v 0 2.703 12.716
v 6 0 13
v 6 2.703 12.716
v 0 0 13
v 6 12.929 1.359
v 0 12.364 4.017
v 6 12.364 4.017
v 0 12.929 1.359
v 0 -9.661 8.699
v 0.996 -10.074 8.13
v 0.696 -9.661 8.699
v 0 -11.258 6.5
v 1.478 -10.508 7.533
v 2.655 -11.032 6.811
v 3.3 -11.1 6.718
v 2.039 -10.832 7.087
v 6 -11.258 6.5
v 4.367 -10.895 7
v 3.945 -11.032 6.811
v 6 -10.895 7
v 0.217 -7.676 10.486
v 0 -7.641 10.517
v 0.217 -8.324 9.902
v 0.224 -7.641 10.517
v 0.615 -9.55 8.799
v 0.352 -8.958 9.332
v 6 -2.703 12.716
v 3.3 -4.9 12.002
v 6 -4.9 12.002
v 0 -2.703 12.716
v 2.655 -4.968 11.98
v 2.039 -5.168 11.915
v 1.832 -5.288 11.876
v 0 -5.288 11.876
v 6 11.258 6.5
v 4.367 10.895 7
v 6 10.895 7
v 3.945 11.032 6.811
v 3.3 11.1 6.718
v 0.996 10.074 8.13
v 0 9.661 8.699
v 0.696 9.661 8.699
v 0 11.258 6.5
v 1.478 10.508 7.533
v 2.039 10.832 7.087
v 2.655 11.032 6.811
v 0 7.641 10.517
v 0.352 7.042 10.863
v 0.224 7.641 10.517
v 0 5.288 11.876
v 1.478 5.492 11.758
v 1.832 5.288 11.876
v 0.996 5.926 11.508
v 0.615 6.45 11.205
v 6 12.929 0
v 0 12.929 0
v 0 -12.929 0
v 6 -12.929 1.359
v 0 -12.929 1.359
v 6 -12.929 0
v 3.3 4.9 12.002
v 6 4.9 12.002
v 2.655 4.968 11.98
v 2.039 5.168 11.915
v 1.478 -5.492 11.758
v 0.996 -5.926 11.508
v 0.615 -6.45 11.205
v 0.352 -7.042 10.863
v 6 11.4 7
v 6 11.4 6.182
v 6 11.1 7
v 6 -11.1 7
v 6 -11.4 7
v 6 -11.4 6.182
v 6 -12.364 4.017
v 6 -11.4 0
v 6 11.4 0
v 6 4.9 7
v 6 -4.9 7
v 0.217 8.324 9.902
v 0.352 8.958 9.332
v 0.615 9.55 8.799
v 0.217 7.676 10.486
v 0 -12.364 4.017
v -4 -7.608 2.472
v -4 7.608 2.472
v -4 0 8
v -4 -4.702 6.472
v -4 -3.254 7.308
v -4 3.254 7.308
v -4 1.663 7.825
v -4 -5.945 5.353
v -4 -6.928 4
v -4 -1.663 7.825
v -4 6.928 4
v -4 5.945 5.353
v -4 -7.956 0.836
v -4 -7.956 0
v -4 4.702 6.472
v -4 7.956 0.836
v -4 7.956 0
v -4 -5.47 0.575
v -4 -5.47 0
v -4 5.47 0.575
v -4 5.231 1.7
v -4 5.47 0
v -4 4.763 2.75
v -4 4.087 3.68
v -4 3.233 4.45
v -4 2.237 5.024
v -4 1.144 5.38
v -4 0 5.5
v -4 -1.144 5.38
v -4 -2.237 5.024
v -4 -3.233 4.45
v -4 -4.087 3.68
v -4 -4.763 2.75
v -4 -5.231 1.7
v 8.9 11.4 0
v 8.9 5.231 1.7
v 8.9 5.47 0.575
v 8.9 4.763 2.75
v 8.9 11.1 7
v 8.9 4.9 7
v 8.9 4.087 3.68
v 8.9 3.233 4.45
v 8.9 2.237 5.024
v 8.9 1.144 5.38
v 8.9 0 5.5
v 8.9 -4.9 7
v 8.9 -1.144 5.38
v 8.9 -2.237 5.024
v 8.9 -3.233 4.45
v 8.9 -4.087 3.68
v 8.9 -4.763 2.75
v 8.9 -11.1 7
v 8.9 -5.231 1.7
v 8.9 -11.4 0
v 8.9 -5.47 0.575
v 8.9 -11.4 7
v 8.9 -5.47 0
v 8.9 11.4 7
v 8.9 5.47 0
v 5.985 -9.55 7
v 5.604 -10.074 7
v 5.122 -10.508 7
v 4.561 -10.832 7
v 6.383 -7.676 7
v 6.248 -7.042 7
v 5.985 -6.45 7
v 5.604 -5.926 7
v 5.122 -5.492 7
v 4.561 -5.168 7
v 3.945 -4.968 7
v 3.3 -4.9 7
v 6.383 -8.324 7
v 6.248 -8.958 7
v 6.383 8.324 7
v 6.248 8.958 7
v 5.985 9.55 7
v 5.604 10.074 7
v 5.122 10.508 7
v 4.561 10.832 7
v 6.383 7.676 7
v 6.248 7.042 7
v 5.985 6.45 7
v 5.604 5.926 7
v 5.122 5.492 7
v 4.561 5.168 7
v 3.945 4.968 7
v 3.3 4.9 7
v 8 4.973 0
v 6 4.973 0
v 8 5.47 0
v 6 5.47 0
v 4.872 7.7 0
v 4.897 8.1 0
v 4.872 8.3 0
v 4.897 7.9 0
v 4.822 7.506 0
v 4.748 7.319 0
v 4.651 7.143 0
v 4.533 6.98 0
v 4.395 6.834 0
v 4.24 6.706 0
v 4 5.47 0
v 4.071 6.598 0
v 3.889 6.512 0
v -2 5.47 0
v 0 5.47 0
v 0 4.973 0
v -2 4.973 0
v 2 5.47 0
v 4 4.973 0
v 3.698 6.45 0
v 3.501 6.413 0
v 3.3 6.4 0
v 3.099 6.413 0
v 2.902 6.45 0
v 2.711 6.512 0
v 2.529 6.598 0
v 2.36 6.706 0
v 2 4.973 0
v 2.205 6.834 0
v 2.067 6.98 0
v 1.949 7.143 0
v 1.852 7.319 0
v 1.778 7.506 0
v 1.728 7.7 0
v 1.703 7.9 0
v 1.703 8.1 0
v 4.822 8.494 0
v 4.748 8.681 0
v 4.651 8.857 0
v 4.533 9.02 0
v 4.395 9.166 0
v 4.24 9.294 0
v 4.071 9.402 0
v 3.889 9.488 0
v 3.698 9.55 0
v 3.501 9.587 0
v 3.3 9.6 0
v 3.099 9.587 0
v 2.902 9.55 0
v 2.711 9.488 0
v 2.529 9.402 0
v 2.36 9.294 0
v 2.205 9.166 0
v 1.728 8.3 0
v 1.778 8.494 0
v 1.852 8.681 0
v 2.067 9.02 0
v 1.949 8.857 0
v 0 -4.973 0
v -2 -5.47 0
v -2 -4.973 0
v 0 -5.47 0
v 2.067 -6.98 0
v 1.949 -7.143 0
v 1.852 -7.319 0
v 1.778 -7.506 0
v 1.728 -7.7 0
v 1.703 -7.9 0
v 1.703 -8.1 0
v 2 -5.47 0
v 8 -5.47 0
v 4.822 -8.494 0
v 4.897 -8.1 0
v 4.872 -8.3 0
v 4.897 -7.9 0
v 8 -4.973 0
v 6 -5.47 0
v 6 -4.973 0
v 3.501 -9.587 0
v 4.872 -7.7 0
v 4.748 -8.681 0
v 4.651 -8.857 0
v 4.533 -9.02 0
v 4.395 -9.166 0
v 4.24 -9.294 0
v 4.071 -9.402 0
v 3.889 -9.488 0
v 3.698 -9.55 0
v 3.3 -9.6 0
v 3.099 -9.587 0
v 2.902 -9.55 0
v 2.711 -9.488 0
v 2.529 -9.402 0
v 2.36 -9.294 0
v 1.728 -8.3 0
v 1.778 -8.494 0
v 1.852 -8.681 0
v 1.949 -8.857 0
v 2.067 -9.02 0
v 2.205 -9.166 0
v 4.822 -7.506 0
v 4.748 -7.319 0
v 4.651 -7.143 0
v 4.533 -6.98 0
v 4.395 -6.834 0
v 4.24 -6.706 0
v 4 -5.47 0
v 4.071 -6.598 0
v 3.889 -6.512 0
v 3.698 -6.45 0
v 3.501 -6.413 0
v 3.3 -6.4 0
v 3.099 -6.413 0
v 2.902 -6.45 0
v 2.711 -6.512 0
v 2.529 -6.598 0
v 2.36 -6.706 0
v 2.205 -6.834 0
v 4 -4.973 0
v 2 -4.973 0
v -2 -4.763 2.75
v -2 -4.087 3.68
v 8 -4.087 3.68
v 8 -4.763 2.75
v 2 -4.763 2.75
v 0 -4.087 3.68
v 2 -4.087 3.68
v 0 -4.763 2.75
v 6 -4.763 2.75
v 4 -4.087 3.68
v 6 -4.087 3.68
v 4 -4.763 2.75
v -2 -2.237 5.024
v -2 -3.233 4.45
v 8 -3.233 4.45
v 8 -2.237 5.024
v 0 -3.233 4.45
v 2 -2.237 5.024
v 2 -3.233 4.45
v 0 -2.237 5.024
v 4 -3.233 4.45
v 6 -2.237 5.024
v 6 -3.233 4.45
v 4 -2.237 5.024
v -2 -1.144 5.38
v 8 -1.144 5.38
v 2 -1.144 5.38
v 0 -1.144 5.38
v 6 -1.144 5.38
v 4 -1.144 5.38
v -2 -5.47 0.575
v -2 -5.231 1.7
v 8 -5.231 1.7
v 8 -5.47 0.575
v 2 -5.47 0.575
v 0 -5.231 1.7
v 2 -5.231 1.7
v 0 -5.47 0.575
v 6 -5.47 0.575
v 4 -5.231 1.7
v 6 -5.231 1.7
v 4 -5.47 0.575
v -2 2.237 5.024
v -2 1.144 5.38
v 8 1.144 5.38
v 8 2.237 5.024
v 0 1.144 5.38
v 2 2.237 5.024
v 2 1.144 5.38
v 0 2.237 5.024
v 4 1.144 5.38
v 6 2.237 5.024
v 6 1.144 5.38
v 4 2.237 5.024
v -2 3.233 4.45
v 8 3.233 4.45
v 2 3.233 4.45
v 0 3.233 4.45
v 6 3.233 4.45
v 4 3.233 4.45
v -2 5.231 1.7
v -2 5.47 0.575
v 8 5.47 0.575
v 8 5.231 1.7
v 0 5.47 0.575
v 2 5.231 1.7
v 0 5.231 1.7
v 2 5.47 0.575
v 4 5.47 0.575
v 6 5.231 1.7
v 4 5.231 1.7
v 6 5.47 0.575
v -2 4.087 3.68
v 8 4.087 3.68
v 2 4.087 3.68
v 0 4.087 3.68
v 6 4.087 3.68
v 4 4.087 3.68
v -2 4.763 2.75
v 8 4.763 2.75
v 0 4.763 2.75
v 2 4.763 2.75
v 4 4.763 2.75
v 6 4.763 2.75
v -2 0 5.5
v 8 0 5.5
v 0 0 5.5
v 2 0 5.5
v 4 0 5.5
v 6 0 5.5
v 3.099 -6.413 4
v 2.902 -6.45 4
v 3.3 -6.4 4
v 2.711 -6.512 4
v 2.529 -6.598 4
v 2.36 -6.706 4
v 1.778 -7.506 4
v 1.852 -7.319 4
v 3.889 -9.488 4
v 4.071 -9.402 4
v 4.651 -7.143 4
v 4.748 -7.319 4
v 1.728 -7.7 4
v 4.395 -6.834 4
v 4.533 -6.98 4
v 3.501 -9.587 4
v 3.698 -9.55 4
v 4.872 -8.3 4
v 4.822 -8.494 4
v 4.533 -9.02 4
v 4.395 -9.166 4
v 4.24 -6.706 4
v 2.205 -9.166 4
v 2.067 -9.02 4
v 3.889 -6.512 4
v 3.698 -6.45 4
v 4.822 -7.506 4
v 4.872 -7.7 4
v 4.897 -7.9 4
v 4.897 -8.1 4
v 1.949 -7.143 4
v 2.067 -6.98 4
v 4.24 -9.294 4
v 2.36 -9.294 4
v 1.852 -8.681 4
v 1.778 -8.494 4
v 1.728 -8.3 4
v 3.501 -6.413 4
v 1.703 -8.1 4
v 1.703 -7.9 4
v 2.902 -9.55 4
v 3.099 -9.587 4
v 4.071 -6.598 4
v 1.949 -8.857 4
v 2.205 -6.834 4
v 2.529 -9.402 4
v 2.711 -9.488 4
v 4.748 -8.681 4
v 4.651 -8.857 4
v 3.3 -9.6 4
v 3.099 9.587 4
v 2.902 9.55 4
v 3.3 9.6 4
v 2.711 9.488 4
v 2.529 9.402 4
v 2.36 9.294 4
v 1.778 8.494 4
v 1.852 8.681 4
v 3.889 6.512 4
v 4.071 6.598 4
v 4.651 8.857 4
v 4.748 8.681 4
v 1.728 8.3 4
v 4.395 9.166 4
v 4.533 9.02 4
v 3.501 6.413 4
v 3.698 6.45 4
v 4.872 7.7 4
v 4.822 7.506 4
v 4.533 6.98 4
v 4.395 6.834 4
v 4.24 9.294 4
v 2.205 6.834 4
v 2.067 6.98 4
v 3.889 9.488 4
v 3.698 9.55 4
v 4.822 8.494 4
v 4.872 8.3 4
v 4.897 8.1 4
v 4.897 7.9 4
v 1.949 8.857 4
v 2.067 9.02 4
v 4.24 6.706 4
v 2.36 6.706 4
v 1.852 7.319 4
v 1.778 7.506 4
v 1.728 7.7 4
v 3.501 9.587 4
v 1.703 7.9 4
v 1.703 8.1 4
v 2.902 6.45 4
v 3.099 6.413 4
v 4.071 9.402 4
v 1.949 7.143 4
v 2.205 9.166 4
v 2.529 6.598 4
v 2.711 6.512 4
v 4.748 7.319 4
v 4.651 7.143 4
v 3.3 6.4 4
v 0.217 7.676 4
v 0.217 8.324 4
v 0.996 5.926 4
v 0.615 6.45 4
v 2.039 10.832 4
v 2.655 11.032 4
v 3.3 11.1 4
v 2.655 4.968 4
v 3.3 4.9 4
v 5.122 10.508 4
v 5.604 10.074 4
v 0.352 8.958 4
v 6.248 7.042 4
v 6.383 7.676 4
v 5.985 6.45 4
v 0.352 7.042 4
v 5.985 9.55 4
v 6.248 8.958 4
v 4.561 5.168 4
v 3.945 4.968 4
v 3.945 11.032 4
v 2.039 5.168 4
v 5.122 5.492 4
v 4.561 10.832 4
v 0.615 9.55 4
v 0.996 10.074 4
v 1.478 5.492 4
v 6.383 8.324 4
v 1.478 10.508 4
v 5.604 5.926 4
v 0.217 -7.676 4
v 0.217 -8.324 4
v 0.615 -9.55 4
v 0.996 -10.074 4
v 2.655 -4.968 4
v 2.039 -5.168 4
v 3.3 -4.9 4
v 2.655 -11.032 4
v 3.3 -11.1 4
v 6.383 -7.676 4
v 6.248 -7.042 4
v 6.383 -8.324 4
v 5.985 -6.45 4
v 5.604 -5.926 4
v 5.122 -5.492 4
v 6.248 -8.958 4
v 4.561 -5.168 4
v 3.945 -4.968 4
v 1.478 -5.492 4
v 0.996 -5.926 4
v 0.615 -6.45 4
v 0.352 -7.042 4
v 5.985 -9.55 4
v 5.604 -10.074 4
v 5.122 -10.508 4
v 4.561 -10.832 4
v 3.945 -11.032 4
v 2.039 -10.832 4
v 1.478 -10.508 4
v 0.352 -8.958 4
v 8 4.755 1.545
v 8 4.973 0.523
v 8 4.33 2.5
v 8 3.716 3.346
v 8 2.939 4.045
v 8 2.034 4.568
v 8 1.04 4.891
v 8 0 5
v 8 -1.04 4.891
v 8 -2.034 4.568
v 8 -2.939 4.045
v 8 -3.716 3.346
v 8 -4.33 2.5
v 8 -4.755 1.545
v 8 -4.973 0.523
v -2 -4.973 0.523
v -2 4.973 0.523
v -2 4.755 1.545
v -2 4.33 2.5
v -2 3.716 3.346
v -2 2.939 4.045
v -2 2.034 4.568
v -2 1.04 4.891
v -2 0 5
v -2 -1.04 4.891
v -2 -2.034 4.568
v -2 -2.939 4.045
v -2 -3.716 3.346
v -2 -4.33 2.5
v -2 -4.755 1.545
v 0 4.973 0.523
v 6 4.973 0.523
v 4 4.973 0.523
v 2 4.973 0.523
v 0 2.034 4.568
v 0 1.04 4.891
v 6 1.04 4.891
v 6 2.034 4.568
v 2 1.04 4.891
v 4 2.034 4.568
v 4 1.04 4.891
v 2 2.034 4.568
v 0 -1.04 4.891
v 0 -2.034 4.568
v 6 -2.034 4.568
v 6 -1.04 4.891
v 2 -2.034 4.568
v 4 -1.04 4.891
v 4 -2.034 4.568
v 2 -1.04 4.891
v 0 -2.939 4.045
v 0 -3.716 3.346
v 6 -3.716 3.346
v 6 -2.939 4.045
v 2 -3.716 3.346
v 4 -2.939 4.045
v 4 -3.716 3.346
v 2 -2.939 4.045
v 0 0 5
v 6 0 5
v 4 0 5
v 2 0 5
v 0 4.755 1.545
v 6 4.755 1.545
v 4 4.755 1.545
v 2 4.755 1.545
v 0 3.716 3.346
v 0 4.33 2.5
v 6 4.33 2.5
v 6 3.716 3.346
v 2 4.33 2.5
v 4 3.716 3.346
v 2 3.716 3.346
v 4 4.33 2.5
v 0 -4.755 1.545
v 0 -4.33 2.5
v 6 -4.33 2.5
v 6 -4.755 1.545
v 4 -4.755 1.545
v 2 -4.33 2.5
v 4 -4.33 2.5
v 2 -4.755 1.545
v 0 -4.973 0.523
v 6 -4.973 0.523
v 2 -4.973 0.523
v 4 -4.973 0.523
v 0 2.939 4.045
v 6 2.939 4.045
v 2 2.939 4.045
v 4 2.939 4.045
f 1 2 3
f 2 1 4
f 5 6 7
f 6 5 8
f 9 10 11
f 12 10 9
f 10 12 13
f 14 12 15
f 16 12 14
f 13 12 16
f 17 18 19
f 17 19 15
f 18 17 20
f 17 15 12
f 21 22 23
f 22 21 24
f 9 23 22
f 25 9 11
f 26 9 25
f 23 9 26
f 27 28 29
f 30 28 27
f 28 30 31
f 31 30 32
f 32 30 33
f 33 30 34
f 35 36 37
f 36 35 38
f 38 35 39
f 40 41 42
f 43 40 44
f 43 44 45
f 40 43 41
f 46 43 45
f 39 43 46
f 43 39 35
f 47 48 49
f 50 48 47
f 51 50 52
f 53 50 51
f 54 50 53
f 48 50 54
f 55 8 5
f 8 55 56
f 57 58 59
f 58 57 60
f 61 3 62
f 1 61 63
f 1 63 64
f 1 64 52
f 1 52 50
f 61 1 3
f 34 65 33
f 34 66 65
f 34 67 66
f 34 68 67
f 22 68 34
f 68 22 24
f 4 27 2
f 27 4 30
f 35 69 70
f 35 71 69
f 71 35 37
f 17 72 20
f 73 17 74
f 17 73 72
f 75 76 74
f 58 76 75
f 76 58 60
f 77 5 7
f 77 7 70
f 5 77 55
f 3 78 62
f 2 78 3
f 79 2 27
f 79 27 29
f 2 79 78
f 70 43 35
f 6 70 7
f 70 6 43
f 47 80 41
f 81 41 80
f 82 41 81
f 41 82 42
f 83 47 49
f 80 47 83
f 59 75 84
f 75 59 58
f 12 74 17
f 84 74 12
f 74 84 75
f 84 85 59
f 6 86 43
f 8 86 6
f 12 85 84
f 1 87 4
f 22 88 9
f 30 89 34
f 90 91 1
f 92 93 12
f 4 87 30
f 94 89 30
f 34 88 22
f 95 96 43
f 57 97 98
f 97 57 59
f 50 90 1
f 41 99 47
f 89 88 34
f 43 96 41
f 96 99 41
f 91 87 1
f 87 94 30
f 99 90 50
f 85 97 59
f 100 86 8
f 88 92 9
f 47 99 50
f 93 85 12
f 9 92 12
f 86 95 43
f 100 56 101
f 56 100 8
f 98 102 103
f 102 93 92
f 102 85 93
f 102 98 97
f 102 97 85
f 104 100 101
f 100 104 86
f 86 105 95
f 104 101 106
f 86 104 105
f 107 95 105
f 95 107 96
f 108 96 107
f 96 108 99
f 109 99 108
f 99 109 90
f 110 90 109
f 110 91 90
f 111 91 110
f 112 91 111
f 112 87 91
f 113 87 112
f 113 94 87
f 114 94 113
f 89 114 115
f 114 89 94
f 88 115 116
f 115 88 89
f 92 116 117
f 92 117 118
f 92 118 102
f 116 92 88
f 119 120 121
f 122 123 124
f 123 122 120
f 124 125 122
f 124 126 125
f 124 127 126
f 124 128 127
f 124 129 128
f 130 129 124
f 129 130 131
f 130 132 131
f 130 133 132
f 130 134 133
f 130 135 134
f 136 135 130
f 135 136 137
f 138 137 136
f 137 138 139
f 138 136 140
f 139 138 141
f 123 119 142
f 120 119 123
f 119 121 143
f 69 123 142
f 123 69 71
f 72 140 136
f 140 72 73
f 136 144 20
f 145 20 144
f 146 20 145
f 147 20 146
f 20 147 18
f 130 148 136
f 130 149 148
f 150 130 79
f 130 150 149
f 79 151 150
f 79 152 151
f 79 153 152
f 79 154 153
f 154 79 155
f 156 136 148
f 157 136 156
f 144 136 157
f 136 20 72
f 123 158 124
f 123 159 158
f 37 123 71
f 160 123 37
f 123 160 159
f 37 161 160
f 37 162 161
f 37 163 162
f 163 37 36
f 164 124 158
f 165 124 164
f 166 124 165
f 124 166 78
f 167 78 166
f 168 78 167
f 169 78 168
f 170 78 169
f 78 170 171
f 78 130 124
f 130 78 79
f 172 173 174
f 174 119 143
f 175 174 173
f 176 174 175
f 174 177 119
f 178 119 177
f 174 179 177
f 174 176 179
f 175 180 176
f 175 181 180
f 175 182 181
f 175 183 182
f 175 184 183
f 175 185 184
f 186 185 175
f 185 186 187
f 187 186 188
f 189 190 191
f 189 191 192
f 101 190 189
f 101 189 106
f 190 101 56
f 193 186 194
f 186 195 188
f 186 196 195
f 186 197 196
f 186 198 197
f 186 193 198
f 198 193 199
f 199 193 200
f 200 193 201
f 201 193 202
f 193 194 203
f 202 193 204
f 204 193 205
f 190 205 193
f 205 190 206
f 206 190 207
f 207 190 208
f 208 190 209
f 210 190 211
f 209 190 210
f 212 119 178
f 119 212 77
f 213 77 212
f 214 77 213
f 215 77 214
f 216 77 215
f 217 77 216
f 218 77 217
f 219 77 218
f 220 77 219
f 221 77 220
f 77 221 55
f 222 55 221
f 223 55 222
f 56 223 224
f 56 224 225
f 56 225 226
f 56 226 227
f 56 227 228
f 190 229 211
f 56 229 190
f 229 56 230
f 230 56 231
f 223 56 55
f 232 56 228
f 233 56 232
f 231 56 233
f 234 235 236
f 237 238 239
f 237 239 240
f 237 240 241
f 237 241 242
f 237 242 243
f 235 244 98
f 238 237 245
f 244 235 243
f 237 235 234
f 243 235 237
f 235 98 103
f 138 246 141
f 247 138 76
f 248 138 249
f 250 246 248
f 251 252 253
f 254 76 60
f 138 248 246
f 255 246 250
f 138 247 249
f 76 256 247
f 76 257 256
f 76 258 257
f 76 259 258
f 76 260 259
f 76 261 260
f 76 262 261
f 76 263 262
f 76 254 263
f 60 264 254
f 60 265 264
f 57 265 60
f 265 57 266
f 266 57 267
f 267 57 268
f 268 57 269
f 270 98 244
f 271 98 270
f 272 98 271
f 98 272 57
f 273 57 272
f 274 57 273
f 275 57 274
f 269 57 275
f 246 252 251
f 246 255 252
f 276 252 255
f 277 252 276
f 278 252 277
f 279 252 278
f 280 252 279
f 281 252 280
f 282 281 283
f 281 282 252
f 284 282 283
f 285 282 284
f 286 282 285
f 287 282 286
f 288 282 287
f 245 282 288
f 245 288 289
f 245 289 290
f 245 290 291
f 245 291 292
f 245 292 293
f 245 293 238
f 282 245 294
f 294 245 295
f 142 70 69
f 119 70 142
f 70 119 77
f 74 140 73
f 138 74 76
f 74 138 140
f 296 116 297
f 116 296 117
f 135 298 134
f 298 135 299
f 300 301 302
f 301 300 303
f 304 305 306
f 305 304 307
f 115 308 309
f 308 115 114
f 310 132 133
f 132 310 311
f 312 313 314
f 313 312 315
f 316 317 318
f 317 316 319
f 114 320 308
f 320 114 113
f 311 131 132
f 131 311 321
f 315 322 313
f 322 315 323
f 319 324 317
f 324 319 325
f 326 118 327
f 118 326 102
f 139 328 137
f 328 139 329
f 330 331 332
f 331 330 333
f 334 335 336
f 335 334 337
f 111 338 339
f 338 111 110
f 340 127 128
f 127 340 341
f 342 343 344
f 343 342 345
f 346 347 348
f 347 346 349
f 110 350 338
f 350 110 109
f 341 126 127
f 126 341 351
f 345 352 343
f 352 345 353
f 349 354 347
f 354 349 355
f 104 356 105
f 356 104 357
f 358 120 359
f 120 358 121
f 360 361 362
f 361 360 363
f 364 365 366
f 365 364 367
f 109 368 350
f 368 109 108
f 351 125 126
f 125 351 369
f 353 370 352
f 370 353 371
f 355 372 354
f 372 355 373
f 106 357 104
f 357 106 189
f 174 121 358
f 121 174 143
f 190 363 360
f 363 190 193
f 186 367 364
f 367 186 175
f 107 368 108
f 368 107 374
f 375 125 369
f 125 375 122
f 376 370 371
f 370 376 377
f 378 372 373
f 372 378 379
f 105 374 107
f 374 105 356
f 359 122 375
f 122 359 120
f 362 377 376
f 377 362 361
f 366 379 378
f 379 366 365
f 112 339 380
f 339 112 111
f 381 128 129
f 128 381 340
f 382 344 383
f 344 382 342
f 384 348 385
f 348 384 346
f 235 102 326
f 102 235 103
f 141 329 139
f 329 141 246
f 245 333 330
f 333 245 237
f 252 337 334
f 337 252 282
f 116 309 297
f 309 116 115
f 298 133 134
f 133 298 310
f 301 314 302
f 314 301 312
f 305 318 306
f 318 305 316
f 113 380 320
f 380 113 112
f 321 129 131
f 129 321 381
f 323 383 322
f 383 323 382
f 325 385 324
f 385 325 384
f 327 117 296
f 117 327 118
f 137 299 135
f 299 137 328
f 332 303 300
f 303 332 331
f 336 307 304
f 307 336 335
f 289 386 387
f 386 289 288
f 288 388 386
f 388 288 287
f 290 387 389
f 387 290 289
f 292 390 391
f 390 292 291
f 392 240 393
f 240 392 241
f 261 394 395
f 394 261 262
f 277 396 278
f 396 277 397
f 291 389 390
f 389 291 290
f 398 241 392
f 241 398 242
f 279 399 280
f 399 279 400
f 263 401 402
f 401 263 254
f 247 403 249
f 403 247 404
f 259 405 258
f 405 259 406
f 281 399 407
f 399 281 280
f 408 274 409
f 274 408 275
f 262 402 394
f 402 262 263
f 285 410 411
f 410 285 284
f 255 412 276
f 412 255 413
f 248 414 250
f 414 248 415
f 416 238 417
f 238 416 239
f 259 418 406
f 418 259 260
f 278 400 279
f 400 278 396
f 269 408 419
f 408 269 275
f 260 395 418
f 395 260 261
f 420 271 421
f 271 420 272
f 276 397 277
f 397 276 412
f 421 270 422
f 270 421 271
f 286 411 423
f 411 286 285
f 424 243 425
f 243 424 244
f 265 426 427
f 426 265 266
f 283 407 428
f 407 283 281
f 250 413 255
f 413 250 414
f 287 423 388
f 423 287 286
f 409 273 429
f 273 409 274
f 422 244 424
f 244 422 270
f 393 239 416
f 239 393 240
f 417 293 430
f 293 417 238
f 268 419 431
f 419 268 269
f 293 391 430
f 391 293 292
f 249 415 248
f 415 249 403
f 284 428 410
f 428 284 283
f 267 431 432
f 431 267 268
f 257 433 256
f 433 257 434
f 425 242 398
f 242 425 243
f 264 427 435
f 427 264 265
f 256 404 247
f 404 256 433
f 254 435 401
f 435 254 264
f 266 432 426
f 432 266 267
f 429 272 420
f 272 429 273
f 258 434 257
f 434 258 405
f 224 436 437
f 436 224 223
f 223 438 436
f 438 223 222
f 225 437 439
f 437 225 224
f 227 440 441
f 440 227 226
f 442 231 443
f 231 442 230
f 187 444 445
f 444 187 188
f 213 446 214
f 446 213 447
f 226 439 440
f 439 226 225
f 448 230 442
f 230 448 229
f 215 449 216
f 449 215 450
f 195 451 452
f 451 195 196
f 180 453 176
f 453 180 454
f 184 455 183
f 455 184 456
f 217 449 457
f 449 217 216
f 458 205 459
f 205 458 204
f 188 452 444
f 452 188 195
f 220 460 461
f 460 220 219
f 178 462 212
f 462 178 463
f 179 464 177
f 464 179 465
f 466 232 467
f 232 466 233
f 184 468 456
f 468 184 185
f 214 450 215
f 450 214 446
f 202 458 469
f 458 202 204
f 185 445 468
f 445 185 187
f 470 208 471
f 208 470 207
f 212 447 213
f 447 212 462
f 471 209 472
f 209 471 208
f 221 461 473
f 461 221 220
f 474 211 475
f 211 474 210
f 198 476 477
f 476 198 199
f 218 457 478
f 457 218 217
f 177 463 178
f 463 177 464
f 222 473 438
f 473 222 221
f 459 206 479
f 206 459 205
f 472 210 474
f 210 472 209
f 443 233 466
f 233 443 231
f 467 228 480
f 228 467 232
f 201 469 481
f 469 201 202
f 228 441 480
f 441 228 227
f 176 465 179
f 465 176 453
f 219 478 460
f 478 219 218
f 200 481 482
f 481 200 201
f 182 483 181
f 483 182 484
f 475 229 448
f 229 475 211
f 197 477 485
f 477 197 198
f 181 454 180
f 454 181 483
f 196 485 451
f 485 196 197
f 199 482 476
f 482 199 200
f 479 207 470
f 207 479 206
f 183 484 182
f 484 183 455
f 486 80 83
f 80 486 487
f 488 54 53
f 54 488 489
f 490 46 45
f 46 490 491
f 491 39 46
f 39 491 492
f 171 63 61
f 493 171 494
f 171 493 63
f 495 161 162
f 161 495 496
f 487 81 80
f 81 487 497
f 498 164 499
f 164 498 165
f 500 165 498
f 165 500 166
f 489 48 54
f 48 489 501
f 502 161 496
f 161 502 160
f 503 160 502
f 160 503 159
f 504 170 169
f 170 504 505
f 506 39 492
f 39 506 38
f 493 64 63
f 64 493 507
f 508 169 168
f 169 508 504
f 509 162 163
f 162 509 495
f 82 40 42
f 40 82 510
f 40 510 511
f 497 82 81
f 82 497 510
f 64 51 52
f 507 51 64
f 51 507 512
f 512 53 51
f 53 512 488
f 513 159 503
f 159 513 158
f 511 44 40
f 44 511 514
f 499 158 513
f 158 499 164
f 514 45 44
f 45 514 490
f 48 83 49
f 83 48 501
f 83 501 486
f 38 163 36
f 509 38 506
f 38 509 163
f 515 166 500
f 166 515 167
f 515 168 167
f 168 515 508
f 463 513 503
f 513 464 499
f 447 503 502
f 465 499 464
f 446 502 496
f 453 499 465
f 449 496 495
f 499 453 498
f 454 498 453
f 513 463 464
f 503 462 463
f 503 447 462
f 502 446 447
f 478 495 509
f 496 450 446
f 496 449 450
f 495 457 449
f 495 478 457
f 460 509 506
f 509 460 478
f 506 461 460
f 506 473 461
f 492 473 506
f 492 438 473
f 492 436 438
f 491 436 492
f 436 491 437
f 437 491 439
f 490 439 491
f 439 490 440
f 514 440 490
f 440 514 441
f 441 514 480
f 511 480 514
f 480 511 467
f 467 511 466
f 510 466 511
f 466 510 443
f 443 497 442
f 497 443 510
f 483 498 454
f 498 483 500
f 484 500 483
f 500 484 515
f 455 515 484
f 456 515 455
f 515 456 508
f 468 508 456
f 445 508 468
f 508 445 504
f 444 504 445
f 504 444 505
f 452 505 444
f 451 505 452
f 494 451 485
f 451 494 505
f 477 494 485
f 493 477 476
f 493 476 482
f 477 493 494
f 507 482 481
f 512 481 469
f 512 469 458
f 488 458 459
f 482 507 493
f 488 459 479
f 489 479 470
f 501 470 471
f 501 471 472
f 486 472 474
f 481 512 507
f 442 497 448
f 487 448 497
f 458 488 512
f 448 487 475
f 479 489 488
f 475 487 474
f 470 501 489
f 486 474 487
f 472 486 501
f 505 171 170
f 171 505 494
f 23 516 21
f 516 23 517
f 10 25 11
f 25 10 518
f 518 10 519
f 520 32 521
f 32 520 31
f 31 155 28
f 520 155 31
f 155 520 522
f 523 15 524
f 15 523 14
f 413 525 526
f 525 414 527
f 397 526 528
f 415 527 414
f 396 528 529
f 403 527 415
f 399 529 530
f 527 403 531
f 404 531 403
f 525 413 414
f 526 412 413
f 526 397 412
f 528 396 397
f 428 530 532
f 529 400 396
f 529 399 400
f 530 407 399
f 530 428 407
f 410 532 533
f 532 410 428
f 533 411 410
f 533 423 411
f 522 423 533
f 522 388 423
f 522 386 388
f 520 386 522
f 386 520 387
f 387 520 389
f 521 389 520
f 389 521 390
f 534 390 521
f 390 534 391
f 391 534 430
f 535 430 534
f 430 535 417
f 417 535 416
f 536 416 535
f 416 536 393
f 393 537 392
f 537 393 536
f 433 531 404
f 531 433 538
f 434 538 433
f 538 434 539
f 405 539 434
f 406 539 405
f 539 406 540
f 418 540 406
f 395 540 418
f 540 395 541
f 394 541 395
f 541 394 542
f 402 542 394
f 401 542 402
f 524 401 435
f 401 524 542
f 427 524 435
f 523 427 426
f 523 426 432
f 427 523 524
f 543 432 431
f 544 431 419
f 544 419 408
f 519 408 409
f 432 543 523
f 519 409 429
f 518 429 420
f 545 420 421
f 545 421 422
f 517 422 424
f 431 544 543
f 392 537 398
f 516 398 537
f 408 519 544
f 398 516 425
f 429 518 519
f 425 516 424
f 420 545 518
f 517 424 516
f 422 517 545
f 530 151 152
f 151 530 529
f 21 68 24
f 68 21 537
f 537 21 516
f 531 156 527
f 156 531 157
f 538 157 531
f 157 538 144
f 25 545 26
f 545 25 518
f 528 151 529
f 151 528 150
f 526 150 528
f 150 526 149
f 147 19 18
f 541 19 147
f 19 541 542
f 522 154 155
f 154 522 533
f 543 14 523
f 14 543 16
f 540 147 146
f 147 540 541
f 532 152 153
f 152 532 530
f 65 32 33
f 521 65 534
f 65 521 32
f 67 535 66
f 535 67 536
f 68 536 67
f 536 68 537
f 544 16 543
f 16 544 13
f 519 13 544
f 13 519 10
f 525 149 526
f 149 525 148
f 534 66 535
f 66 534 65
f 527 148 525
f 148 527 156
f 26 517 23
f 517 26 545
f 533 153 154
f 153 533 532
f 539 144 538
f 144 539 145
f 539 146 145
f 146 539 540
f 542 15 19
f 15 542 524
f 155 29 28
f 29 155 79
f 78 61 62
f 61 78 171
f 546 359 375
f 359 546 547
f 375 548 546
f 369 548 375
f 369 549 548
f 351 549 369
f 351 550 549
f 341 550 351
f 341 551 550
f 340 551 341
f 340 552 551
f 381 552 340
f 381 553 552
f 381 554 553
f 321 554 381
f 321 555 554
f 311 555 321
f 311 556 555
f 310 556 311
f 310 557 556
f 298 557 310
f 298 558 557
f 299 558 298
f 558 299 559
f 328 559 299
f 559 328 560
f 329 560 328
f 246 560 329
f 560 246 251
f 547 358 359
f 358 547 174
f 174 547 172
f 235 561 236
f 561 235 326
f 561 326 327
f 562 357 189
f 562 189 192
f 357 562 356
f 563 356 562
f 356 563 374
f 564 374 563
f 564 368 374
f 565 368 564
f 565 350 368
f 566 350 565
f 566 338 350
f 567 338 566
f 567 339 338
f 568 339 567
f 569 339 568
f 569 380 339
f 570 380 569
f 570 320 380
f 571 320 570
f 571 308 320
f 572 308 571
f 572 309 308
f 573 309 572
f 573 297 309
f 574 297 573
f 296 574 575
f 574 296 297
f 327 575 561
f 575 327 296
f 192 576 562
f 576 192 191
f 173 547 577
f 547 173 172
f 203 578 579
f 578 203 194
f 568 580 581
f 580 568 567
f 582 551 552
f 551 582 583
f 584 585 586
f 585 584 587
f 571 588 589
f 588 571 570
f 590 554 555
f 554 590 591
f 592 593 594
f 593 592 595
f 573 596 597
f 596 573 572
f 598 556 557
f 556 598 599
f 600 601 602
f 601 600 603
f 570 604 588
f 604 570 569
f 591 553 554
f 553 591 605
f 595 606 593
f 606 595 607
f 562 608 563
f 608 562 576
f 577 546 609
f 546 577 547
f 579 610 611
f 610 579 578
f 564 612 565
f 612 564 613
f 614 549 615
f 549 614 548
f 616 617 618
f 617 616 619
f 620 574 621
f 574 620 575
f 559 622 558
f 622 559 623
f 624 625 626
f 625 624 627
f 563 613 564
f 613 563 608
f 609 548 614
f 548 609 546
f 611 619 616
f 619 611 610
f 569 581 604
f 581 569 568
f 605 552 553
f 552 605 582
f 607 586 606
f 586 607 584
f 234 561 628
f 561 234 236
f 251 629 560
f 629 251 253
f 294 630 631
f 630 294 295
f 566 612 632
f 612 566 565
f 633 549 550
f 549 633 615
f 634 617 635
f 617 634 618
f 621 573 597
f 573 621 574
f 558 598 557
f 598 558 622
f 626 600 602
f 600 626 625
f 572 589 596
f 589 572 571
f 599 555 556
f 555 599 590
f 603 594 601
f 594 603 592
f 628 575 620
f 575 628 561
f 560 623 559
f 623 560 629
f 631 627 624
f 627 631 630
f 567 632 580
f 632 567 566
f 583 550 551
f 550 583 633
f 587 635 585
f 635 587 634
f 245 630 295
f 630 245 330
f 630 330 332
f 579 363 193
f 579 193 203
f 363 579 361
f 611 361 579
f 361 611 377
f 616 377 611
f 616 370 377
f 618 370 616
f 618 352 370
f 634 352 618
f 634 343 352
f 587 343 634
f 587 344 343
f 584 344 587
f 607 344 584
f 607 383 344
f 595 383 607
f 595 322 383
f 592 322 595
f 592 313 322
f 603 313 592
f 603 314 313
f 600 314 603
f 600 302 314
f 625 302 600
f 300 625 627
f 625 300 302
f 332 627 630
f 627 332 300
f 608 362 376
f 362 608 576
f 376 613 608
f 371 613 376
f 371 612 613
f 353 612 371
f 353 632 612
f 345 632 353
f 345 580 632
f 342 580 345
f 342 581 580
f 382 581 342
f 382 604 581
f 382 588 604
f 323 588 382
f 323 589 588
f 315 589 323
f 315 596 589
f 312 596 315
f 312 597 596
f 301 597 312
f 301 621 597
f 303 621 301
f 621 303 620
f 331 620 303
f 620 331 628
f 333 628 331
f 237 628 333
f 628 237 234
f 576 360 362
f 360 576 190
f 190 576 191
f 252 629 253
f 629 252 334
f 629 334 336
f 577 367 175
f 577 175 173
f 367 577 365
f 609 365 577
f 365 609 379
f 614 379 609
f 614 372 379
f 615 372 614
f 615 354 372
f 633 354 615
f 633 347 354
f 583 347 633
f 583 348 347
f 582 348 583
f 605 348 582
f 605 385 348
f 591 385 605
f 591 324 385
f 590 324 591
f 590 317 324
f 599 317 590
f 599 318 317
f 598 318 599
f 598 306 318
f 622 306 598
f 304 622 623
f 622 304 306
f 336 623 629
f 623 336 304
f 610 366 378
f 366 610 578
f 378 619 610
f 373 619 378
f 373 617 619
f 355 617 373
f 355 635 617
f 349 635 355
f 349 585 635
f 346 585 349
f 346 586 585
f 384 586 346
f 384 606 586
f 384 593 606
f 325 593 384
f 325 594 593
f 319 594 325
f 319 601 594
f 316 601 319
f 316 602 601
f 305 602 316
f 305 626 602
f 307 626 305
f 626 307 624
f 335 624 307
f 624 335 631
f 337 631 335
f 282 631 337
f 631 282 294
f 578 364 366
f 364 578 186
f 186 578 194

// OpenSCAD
// PRUSA iteration4
// Extruder cable clip
// GNU GPL v3
// Josef Průša <iam@josefprusa.cz> and contributors
// http://www.reprap.org/wiki/Prusa_Mendel
// http://prusamendel.org

module extruder_cable_clip(){
    difference(){
        union(){
            // body shape
            translate([-6,28,28]) rotate([0,90,0]) cylinder(h=6,r=13,$fn=30);
            translate([-10,28,28]) rotate([0,90,0]) cylinder(h=4,r1=8,r2=13,$fn=30);
            translate([0,16.6,28]) cube([2.9,22.8,7]);
        }

        // bottom cut and shape
        translate([-15,7,13]) cube([30,40,15]);
        translate([-20,28,28]) rotate([0,90,0]) cylinder(h=40,r=5.5,$fn=30);

        // screws
        translate([-2.7,20.0,25]) rotate([0,0,90]) cylinder(h=10,r=1.6,$fn=50);
        translate([-2.7,36,25]) rotate([0,0,90]) cylinder(h=10,r=1.6,$fn=50);
        translate([-2.7,36,32]) rotate([0,0,90]) cylinder(h=13,r=3.1,$fn=30);
        translate([-2.7,20.0,32]) rotate([0,0,90]) cylinder(h=13,r=3.1,$fn=30);

        // screw heads opening
        translate([-2.7,16.9,35]) cube([10,6.2,15]);
        translate([-2.7,32.9,35]) cube([10,6.2,15]);
    }

    difference(){
        // cable grip
        translate([-8,28,28]) rotate([0,90,0]) cylinder(h=10,r=6,$fn=30);
        translate([-20,28,28]) rotate([0,90,0]) cylinder(h=40,r=5,$fn=30);
        translate([-15,7,13]) cube([30,40,15]);
        translate([-6,7,13]) cube([2,40,25]);
        translate([-2,7,13]) cube([2,40,25]);
    }
}

translate([6,-28,-28]) extruder_cable_clip();
